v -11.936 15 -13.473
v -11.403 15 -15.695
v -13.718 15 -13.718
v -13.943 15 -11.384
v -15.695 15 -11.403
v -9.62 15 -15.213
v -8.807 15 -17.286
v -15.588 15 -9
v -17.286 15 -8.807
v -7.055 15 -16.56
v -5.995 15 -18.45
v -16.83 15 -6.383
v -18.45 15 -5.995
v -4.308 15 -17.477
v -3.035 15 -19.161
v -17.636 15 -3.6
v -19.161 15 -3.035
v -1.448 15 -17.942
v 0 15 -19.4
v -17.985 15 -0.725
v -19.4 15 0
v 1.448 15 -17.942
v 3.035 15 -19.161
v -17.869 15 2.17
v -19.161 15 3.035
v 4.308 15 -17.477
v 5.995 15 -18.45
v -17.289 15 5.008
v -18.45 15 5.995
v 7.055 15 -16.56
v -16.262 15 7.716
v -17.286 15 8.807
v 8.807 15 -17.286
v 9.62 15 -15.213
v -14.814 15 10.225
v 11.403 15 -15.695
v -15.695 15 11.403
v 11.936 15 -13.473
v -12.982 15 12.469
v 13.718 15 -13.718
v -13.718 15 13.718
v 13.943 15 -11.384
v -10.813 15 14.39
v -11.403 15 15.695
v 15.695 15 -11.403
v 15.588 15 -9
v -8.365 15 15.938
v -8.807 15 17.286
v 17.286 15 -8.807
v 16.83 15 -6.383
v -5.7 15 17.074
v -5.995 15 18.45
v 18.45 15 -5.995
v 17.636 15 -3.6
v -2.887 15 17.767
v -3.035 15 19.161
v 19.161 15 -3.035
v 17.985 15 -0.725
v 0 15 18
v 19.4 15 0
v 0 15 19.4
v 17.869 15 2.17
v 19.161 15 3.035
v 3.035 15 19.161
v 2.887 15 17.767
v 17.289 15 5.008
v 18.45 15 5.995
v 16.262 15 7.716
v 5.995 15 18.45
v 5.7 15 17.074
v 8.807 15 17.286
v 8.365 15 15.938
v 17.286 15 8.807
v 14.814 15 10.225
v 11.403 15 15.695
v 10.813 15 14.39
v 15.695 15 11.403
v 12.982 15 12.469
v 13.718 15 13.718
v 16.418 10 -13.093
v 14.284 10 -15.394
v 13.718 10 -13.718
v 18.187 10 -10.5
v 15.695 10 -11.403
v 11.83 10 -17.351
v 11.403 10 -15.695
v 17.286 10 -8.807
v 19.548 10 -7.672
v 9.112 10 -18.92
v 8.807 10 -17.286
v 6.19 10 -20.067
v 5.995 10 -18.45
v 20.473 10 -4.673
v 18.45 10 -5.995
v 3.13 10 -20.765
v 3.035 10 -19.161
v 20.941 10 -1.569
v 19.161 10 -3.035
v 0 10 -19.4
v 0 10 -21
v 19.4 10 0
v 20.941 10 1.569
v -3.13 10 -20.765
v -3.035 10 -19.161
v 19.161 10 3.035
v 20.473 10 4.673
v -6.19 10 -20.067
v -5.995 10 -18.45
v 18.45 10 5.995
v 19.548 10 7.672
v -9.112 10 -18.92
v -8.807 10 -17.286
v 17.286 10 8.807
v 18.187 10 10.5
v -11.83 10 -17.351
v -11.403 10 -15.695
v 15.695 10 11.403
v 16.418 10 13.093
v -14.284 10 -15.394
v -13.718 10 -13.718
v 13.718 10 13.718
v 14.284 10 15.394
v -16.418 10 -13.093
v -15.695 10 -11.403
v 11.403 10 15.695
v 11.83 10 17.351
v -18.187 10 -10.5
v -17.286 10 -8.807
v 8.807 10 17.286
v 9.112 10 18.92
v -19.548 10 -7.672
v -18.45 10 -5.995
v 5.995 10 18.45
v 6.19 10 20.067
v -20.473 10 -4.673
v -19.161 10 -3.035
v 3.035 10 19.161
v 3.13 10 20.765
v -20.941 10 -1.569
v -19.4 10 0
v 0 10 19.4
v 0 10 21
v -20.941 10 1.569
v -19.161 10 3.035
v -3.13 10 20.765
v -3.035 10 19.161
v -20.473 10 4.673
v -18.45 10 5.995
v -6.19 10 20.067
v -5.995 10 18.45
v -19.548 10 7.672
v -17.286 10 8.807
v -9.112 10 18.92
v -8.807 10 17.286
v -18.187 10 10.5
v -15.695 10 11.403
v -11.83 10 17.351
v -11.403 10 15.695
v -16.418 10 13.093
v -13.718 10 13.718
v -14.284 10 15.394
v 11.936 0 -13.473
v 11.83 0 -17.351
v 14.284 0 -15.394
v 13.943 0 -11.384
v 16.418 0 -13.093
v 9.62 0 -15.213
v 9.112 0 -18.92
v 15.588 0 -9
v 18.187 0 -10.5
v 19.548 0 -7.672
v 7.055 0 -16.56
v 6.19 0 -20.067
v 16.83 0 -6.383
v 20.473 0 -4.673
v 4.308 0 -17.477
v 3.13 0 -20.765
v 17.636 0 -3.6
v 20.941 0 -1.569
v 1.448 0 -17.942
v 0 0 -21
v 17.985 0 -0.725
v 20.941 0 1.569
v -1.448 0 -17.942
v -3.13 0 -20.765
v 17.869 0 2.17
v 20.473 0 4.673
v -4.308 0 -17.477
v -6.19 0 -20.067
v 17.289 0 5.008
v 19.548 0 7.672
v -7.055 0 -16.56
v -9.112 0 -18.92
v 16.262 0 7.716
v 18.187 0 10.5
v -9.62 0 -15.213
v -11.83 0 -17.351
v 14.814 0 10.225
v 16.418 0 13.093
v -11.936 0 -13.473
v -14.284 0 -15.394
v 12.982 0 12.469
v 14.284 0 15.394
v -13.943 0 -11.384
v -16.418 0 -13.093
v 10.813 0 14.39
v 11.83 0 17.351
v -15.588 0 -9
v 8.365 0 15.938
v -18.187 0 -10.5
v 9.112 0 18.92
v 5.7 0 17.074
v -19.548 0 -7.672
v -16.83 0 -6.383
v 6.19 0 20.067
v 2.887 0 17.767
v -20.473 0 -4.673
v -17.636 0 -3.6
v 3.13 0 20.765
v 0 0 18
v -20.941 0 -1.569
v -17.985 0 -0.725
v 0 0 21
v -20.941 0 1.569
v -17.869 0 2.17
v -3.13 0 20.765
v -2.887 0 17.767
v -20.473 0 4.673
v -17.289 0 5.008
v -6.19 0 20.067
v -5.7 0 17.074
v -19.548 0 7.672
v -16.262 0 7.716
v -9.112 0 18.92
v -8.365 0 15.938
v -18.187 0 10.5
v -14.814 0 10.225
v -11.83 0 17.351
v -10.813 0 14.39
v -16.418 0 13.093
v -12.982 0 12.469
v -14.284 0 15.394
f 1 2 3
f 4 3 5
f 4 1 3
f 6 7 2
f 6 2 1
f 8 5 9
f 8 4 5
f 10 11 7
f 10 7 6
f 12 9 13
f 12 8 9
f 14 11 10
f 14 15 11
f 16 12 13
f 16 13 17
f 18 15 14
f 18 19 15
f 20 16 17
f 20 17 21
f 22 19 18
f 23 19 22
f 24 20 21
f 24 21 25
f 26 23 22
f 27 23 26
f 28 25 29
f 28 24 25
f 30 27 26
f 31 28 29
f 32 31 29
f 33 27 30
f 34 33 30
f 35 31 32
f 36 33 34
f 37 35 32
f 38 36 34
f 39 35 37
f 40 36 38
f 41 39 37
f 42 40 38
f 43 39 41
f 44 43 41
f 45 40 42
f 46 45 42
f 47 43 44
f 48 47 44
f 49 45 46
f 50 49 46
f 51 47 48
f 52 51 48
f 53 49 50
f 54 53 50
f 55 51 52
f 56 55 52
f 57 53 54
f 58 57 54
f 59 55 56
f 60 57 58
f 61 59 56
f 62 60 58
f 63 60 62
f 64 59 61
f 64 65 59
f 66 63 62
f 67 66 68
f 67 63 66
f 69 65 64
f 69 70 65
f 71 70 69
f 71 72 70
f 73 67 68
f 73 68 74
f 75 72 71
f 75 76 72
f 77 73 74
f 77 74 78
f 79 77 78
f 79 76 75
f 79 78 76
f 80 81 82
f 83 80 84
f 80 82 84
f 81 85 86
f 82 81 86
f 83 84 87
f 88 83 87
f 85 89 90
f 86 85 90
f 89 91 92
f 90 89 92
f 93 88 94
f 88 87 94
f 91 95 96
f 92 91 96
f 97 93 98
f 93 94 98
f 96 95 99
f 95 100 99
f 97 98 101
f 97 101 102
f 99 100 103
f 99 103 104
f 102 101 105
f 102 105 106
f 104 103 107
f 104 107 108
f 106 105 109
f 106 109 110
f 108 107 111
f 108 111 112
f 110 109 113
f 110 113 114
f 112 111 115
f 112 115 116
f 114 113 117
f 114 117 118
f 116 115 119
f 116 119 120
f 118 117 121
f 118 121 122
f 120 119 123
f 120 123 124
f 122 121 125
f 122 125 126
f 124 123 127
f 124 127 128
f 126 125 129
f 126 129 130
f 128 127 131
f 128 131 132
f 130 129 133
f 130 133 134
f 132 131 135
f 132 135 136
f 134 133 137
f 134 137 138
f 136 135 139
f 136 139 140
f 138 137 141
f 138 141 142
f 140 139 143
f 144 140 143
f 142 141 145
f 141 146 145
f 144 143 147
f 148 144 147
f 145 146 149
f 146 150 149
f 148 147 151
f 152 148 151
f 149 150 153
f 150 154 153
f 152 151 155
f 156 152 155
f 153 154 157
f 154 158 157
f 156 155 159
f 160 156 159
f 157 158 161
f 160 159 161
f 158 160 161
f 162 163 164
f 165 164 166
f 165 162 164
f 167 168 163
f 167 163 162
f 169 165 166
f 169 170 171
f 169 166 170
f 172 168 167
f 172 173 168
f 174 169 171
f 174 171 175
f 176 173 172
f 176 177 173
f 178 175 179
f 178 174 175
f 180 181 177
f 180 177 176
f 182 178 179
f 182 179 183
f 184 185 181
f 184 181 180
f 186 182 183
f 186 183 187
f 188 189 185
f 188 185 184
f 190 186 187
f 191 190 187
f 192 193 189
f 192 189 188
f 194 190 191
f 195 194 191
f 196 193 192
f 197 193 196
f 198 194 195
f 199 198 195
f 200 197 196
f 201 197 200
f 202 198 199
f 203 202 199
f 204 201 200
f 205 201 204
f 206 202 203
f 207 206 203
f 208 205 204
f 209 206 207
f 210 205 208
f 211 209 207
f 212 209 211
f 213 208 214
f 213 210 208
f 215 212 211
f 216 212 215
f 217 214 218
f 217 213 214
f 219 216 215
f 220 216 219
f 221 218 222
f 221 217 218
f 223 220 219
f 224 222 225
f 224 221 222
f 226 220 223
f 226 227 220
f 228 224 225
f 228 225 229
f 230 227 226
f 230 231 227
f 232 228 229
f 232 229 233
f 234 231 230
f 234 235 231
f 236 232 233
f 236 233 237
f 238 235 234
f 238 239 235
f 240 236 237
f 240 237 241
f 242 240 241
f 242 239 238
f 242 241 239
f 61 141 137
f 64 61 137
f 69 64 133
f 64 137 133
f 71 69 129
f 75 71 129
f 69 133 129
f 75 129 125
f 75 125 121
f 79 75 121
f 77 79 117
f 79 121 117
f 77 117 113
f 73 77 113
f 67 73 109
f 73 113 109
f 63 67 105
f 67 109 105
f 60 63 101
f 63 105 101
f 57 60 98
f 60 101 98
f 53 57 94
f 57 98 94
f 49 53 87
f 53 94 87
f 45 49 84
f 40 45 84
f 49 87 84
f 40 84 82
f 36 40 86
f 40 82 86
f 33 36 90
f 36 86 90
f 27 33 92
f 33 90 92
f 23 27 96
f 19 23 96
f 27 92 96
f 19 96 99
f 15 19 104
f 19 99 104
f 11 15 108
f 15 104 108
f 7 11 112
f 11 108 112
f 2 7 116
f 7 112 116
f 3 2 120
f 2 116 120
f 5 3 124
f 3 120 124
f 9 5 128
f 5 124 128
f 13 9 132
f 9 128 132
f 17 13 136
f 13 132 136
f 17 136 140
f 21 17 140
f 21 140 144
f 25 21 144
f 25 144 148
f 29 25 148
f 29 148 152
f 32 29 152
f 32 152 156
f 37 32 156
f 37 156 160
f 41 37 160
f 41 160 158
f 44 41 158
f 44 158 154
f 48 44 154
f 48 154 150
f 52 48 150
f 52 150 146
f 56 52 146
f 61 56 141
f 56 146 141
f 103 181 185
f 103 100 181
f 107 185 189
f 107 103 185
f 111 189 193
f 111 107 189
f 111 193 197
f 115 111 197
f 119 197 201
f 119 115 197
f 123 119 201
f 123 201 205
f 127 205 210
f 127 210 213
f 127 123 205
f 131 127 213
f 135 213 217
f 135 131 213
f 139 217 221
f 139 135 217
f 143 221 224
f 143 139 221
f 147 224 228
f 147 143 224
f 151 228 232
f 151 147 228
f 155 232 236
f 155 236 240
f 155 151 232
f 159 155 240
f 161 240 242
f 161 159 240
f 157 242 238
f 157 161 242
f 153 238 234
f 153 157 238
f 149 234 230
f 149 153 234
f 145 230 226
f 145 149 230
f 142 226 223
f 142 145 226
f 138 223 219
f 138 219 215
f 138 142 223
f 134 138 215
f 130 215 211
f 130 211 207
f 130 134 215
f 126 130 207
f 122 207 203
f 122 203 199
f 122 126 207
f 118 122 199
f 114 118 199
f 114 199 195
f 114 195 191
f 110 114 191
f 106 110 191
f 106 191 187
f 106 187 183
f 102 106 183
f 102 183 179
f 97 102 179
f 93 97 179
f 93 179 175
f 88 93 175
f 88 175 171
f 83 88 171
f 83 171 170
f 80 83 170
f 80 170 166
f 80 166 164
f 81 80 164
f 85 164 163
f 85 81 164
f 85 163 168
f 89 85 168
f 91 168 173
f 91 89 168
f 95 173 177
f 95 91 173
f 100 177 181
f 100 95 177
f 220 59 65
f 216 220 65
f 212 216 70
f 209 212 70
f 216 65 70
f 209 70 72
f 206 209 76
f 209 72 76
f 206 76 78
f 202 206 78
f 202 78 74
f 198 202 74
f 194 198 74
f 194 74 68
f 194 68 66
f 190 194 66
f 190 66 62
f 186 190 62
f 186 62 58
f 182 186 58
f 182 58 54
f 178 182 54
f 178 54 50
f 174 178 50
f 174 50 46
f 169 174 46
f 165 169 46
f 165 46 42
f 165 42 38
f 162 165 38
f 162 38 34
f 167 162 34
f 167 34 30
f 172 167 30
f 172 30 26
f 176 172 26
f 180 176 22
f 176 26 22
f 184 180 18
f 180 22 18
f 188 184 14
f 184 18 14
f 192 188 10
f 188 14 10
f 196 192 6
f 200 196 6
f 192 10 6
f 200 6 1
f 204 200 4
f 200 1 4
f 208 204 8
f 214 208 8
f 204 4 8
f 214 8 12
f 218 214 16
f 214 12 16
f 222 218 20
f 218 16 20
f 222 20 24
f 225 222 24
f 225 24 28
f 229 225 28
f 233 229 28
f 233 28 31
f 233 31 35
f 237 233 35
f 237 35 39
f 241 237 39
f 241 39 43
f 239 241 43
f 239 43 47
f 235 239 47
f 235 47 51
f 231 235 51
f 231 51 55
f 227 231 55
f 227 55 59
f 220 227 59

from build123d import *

# Parameters (mm, degrees)
SKETCH1_W           = 21
SKETCH1_H           = 10
SKETCH2_R           = 18
CUT_EXTRUDE1_DEPTH  = 32.336879232
SKETCH4_R           = 19.4
BOSS_EXTRUDE1_DEPTH = 5
SKETCH5_R           = 18
CUT_EXTRUDE2_DEPTH  = 34.271609519


with BuildPart() as part:
    # Sketch1 → Revolve1 (revolve)
    with BuildSketch(Plane.XY, mode=Mode.PRIVATE) as revolve1_sk:
        with Locations((10.5, 5)):
            Rectangle(SKETCH1_W, SKETCH1_H)
    revolve(revolve1_sk.sketch.rotate(Axis((0, 0, 0), (0, 1, 0)), 90), axis=Axis((0, 0, 0), (0, 1, 0)))

    # Sketch2 → Cut-Extrude1 (cut, through all)
    with BuildSketch(Plane(origin=(0, 10, 0), x_dir=(1, 0, 0), z_dir=(0, 1, 0))):
        with Locations(Location((0, 0, 0), (0, 0, 270))):
            Circle(SKETCH2_R)
    extrude(amount=-CUT_EXTRUDE1_DEPTH, mode=Mode.SUBTRACT)

    # Sketch4 → Boss-Extrude1 (add)
    with BuildSketch(Plane(origin=(0, 10, 0), x_dir=(1, 0, 0), z_dir=(0, 1, 0))):
        with Locations(Location((0, 0, 0), (0, 0, 270))):
            Circle(SKETCH4_R)
    extrude(amount=BOSS_EXTRUDE1_DEPTH)

    # Sketch5 → Cut-Extrude2 (cut, through all)
    with BuildSketch(Plane(origin=(0, 15, 0), x_dir=(1, 0, 0), z_dir=(0, 1, 0))):
        with Locations(Location((0, 0, 0), (0, 0, 270))):
            Circle(SKETCH5_R)
    extrude(amount=-CUT_EXTRUDE2_DEPTH, mode=Mode.SUBTRACT)


solid = part.part
